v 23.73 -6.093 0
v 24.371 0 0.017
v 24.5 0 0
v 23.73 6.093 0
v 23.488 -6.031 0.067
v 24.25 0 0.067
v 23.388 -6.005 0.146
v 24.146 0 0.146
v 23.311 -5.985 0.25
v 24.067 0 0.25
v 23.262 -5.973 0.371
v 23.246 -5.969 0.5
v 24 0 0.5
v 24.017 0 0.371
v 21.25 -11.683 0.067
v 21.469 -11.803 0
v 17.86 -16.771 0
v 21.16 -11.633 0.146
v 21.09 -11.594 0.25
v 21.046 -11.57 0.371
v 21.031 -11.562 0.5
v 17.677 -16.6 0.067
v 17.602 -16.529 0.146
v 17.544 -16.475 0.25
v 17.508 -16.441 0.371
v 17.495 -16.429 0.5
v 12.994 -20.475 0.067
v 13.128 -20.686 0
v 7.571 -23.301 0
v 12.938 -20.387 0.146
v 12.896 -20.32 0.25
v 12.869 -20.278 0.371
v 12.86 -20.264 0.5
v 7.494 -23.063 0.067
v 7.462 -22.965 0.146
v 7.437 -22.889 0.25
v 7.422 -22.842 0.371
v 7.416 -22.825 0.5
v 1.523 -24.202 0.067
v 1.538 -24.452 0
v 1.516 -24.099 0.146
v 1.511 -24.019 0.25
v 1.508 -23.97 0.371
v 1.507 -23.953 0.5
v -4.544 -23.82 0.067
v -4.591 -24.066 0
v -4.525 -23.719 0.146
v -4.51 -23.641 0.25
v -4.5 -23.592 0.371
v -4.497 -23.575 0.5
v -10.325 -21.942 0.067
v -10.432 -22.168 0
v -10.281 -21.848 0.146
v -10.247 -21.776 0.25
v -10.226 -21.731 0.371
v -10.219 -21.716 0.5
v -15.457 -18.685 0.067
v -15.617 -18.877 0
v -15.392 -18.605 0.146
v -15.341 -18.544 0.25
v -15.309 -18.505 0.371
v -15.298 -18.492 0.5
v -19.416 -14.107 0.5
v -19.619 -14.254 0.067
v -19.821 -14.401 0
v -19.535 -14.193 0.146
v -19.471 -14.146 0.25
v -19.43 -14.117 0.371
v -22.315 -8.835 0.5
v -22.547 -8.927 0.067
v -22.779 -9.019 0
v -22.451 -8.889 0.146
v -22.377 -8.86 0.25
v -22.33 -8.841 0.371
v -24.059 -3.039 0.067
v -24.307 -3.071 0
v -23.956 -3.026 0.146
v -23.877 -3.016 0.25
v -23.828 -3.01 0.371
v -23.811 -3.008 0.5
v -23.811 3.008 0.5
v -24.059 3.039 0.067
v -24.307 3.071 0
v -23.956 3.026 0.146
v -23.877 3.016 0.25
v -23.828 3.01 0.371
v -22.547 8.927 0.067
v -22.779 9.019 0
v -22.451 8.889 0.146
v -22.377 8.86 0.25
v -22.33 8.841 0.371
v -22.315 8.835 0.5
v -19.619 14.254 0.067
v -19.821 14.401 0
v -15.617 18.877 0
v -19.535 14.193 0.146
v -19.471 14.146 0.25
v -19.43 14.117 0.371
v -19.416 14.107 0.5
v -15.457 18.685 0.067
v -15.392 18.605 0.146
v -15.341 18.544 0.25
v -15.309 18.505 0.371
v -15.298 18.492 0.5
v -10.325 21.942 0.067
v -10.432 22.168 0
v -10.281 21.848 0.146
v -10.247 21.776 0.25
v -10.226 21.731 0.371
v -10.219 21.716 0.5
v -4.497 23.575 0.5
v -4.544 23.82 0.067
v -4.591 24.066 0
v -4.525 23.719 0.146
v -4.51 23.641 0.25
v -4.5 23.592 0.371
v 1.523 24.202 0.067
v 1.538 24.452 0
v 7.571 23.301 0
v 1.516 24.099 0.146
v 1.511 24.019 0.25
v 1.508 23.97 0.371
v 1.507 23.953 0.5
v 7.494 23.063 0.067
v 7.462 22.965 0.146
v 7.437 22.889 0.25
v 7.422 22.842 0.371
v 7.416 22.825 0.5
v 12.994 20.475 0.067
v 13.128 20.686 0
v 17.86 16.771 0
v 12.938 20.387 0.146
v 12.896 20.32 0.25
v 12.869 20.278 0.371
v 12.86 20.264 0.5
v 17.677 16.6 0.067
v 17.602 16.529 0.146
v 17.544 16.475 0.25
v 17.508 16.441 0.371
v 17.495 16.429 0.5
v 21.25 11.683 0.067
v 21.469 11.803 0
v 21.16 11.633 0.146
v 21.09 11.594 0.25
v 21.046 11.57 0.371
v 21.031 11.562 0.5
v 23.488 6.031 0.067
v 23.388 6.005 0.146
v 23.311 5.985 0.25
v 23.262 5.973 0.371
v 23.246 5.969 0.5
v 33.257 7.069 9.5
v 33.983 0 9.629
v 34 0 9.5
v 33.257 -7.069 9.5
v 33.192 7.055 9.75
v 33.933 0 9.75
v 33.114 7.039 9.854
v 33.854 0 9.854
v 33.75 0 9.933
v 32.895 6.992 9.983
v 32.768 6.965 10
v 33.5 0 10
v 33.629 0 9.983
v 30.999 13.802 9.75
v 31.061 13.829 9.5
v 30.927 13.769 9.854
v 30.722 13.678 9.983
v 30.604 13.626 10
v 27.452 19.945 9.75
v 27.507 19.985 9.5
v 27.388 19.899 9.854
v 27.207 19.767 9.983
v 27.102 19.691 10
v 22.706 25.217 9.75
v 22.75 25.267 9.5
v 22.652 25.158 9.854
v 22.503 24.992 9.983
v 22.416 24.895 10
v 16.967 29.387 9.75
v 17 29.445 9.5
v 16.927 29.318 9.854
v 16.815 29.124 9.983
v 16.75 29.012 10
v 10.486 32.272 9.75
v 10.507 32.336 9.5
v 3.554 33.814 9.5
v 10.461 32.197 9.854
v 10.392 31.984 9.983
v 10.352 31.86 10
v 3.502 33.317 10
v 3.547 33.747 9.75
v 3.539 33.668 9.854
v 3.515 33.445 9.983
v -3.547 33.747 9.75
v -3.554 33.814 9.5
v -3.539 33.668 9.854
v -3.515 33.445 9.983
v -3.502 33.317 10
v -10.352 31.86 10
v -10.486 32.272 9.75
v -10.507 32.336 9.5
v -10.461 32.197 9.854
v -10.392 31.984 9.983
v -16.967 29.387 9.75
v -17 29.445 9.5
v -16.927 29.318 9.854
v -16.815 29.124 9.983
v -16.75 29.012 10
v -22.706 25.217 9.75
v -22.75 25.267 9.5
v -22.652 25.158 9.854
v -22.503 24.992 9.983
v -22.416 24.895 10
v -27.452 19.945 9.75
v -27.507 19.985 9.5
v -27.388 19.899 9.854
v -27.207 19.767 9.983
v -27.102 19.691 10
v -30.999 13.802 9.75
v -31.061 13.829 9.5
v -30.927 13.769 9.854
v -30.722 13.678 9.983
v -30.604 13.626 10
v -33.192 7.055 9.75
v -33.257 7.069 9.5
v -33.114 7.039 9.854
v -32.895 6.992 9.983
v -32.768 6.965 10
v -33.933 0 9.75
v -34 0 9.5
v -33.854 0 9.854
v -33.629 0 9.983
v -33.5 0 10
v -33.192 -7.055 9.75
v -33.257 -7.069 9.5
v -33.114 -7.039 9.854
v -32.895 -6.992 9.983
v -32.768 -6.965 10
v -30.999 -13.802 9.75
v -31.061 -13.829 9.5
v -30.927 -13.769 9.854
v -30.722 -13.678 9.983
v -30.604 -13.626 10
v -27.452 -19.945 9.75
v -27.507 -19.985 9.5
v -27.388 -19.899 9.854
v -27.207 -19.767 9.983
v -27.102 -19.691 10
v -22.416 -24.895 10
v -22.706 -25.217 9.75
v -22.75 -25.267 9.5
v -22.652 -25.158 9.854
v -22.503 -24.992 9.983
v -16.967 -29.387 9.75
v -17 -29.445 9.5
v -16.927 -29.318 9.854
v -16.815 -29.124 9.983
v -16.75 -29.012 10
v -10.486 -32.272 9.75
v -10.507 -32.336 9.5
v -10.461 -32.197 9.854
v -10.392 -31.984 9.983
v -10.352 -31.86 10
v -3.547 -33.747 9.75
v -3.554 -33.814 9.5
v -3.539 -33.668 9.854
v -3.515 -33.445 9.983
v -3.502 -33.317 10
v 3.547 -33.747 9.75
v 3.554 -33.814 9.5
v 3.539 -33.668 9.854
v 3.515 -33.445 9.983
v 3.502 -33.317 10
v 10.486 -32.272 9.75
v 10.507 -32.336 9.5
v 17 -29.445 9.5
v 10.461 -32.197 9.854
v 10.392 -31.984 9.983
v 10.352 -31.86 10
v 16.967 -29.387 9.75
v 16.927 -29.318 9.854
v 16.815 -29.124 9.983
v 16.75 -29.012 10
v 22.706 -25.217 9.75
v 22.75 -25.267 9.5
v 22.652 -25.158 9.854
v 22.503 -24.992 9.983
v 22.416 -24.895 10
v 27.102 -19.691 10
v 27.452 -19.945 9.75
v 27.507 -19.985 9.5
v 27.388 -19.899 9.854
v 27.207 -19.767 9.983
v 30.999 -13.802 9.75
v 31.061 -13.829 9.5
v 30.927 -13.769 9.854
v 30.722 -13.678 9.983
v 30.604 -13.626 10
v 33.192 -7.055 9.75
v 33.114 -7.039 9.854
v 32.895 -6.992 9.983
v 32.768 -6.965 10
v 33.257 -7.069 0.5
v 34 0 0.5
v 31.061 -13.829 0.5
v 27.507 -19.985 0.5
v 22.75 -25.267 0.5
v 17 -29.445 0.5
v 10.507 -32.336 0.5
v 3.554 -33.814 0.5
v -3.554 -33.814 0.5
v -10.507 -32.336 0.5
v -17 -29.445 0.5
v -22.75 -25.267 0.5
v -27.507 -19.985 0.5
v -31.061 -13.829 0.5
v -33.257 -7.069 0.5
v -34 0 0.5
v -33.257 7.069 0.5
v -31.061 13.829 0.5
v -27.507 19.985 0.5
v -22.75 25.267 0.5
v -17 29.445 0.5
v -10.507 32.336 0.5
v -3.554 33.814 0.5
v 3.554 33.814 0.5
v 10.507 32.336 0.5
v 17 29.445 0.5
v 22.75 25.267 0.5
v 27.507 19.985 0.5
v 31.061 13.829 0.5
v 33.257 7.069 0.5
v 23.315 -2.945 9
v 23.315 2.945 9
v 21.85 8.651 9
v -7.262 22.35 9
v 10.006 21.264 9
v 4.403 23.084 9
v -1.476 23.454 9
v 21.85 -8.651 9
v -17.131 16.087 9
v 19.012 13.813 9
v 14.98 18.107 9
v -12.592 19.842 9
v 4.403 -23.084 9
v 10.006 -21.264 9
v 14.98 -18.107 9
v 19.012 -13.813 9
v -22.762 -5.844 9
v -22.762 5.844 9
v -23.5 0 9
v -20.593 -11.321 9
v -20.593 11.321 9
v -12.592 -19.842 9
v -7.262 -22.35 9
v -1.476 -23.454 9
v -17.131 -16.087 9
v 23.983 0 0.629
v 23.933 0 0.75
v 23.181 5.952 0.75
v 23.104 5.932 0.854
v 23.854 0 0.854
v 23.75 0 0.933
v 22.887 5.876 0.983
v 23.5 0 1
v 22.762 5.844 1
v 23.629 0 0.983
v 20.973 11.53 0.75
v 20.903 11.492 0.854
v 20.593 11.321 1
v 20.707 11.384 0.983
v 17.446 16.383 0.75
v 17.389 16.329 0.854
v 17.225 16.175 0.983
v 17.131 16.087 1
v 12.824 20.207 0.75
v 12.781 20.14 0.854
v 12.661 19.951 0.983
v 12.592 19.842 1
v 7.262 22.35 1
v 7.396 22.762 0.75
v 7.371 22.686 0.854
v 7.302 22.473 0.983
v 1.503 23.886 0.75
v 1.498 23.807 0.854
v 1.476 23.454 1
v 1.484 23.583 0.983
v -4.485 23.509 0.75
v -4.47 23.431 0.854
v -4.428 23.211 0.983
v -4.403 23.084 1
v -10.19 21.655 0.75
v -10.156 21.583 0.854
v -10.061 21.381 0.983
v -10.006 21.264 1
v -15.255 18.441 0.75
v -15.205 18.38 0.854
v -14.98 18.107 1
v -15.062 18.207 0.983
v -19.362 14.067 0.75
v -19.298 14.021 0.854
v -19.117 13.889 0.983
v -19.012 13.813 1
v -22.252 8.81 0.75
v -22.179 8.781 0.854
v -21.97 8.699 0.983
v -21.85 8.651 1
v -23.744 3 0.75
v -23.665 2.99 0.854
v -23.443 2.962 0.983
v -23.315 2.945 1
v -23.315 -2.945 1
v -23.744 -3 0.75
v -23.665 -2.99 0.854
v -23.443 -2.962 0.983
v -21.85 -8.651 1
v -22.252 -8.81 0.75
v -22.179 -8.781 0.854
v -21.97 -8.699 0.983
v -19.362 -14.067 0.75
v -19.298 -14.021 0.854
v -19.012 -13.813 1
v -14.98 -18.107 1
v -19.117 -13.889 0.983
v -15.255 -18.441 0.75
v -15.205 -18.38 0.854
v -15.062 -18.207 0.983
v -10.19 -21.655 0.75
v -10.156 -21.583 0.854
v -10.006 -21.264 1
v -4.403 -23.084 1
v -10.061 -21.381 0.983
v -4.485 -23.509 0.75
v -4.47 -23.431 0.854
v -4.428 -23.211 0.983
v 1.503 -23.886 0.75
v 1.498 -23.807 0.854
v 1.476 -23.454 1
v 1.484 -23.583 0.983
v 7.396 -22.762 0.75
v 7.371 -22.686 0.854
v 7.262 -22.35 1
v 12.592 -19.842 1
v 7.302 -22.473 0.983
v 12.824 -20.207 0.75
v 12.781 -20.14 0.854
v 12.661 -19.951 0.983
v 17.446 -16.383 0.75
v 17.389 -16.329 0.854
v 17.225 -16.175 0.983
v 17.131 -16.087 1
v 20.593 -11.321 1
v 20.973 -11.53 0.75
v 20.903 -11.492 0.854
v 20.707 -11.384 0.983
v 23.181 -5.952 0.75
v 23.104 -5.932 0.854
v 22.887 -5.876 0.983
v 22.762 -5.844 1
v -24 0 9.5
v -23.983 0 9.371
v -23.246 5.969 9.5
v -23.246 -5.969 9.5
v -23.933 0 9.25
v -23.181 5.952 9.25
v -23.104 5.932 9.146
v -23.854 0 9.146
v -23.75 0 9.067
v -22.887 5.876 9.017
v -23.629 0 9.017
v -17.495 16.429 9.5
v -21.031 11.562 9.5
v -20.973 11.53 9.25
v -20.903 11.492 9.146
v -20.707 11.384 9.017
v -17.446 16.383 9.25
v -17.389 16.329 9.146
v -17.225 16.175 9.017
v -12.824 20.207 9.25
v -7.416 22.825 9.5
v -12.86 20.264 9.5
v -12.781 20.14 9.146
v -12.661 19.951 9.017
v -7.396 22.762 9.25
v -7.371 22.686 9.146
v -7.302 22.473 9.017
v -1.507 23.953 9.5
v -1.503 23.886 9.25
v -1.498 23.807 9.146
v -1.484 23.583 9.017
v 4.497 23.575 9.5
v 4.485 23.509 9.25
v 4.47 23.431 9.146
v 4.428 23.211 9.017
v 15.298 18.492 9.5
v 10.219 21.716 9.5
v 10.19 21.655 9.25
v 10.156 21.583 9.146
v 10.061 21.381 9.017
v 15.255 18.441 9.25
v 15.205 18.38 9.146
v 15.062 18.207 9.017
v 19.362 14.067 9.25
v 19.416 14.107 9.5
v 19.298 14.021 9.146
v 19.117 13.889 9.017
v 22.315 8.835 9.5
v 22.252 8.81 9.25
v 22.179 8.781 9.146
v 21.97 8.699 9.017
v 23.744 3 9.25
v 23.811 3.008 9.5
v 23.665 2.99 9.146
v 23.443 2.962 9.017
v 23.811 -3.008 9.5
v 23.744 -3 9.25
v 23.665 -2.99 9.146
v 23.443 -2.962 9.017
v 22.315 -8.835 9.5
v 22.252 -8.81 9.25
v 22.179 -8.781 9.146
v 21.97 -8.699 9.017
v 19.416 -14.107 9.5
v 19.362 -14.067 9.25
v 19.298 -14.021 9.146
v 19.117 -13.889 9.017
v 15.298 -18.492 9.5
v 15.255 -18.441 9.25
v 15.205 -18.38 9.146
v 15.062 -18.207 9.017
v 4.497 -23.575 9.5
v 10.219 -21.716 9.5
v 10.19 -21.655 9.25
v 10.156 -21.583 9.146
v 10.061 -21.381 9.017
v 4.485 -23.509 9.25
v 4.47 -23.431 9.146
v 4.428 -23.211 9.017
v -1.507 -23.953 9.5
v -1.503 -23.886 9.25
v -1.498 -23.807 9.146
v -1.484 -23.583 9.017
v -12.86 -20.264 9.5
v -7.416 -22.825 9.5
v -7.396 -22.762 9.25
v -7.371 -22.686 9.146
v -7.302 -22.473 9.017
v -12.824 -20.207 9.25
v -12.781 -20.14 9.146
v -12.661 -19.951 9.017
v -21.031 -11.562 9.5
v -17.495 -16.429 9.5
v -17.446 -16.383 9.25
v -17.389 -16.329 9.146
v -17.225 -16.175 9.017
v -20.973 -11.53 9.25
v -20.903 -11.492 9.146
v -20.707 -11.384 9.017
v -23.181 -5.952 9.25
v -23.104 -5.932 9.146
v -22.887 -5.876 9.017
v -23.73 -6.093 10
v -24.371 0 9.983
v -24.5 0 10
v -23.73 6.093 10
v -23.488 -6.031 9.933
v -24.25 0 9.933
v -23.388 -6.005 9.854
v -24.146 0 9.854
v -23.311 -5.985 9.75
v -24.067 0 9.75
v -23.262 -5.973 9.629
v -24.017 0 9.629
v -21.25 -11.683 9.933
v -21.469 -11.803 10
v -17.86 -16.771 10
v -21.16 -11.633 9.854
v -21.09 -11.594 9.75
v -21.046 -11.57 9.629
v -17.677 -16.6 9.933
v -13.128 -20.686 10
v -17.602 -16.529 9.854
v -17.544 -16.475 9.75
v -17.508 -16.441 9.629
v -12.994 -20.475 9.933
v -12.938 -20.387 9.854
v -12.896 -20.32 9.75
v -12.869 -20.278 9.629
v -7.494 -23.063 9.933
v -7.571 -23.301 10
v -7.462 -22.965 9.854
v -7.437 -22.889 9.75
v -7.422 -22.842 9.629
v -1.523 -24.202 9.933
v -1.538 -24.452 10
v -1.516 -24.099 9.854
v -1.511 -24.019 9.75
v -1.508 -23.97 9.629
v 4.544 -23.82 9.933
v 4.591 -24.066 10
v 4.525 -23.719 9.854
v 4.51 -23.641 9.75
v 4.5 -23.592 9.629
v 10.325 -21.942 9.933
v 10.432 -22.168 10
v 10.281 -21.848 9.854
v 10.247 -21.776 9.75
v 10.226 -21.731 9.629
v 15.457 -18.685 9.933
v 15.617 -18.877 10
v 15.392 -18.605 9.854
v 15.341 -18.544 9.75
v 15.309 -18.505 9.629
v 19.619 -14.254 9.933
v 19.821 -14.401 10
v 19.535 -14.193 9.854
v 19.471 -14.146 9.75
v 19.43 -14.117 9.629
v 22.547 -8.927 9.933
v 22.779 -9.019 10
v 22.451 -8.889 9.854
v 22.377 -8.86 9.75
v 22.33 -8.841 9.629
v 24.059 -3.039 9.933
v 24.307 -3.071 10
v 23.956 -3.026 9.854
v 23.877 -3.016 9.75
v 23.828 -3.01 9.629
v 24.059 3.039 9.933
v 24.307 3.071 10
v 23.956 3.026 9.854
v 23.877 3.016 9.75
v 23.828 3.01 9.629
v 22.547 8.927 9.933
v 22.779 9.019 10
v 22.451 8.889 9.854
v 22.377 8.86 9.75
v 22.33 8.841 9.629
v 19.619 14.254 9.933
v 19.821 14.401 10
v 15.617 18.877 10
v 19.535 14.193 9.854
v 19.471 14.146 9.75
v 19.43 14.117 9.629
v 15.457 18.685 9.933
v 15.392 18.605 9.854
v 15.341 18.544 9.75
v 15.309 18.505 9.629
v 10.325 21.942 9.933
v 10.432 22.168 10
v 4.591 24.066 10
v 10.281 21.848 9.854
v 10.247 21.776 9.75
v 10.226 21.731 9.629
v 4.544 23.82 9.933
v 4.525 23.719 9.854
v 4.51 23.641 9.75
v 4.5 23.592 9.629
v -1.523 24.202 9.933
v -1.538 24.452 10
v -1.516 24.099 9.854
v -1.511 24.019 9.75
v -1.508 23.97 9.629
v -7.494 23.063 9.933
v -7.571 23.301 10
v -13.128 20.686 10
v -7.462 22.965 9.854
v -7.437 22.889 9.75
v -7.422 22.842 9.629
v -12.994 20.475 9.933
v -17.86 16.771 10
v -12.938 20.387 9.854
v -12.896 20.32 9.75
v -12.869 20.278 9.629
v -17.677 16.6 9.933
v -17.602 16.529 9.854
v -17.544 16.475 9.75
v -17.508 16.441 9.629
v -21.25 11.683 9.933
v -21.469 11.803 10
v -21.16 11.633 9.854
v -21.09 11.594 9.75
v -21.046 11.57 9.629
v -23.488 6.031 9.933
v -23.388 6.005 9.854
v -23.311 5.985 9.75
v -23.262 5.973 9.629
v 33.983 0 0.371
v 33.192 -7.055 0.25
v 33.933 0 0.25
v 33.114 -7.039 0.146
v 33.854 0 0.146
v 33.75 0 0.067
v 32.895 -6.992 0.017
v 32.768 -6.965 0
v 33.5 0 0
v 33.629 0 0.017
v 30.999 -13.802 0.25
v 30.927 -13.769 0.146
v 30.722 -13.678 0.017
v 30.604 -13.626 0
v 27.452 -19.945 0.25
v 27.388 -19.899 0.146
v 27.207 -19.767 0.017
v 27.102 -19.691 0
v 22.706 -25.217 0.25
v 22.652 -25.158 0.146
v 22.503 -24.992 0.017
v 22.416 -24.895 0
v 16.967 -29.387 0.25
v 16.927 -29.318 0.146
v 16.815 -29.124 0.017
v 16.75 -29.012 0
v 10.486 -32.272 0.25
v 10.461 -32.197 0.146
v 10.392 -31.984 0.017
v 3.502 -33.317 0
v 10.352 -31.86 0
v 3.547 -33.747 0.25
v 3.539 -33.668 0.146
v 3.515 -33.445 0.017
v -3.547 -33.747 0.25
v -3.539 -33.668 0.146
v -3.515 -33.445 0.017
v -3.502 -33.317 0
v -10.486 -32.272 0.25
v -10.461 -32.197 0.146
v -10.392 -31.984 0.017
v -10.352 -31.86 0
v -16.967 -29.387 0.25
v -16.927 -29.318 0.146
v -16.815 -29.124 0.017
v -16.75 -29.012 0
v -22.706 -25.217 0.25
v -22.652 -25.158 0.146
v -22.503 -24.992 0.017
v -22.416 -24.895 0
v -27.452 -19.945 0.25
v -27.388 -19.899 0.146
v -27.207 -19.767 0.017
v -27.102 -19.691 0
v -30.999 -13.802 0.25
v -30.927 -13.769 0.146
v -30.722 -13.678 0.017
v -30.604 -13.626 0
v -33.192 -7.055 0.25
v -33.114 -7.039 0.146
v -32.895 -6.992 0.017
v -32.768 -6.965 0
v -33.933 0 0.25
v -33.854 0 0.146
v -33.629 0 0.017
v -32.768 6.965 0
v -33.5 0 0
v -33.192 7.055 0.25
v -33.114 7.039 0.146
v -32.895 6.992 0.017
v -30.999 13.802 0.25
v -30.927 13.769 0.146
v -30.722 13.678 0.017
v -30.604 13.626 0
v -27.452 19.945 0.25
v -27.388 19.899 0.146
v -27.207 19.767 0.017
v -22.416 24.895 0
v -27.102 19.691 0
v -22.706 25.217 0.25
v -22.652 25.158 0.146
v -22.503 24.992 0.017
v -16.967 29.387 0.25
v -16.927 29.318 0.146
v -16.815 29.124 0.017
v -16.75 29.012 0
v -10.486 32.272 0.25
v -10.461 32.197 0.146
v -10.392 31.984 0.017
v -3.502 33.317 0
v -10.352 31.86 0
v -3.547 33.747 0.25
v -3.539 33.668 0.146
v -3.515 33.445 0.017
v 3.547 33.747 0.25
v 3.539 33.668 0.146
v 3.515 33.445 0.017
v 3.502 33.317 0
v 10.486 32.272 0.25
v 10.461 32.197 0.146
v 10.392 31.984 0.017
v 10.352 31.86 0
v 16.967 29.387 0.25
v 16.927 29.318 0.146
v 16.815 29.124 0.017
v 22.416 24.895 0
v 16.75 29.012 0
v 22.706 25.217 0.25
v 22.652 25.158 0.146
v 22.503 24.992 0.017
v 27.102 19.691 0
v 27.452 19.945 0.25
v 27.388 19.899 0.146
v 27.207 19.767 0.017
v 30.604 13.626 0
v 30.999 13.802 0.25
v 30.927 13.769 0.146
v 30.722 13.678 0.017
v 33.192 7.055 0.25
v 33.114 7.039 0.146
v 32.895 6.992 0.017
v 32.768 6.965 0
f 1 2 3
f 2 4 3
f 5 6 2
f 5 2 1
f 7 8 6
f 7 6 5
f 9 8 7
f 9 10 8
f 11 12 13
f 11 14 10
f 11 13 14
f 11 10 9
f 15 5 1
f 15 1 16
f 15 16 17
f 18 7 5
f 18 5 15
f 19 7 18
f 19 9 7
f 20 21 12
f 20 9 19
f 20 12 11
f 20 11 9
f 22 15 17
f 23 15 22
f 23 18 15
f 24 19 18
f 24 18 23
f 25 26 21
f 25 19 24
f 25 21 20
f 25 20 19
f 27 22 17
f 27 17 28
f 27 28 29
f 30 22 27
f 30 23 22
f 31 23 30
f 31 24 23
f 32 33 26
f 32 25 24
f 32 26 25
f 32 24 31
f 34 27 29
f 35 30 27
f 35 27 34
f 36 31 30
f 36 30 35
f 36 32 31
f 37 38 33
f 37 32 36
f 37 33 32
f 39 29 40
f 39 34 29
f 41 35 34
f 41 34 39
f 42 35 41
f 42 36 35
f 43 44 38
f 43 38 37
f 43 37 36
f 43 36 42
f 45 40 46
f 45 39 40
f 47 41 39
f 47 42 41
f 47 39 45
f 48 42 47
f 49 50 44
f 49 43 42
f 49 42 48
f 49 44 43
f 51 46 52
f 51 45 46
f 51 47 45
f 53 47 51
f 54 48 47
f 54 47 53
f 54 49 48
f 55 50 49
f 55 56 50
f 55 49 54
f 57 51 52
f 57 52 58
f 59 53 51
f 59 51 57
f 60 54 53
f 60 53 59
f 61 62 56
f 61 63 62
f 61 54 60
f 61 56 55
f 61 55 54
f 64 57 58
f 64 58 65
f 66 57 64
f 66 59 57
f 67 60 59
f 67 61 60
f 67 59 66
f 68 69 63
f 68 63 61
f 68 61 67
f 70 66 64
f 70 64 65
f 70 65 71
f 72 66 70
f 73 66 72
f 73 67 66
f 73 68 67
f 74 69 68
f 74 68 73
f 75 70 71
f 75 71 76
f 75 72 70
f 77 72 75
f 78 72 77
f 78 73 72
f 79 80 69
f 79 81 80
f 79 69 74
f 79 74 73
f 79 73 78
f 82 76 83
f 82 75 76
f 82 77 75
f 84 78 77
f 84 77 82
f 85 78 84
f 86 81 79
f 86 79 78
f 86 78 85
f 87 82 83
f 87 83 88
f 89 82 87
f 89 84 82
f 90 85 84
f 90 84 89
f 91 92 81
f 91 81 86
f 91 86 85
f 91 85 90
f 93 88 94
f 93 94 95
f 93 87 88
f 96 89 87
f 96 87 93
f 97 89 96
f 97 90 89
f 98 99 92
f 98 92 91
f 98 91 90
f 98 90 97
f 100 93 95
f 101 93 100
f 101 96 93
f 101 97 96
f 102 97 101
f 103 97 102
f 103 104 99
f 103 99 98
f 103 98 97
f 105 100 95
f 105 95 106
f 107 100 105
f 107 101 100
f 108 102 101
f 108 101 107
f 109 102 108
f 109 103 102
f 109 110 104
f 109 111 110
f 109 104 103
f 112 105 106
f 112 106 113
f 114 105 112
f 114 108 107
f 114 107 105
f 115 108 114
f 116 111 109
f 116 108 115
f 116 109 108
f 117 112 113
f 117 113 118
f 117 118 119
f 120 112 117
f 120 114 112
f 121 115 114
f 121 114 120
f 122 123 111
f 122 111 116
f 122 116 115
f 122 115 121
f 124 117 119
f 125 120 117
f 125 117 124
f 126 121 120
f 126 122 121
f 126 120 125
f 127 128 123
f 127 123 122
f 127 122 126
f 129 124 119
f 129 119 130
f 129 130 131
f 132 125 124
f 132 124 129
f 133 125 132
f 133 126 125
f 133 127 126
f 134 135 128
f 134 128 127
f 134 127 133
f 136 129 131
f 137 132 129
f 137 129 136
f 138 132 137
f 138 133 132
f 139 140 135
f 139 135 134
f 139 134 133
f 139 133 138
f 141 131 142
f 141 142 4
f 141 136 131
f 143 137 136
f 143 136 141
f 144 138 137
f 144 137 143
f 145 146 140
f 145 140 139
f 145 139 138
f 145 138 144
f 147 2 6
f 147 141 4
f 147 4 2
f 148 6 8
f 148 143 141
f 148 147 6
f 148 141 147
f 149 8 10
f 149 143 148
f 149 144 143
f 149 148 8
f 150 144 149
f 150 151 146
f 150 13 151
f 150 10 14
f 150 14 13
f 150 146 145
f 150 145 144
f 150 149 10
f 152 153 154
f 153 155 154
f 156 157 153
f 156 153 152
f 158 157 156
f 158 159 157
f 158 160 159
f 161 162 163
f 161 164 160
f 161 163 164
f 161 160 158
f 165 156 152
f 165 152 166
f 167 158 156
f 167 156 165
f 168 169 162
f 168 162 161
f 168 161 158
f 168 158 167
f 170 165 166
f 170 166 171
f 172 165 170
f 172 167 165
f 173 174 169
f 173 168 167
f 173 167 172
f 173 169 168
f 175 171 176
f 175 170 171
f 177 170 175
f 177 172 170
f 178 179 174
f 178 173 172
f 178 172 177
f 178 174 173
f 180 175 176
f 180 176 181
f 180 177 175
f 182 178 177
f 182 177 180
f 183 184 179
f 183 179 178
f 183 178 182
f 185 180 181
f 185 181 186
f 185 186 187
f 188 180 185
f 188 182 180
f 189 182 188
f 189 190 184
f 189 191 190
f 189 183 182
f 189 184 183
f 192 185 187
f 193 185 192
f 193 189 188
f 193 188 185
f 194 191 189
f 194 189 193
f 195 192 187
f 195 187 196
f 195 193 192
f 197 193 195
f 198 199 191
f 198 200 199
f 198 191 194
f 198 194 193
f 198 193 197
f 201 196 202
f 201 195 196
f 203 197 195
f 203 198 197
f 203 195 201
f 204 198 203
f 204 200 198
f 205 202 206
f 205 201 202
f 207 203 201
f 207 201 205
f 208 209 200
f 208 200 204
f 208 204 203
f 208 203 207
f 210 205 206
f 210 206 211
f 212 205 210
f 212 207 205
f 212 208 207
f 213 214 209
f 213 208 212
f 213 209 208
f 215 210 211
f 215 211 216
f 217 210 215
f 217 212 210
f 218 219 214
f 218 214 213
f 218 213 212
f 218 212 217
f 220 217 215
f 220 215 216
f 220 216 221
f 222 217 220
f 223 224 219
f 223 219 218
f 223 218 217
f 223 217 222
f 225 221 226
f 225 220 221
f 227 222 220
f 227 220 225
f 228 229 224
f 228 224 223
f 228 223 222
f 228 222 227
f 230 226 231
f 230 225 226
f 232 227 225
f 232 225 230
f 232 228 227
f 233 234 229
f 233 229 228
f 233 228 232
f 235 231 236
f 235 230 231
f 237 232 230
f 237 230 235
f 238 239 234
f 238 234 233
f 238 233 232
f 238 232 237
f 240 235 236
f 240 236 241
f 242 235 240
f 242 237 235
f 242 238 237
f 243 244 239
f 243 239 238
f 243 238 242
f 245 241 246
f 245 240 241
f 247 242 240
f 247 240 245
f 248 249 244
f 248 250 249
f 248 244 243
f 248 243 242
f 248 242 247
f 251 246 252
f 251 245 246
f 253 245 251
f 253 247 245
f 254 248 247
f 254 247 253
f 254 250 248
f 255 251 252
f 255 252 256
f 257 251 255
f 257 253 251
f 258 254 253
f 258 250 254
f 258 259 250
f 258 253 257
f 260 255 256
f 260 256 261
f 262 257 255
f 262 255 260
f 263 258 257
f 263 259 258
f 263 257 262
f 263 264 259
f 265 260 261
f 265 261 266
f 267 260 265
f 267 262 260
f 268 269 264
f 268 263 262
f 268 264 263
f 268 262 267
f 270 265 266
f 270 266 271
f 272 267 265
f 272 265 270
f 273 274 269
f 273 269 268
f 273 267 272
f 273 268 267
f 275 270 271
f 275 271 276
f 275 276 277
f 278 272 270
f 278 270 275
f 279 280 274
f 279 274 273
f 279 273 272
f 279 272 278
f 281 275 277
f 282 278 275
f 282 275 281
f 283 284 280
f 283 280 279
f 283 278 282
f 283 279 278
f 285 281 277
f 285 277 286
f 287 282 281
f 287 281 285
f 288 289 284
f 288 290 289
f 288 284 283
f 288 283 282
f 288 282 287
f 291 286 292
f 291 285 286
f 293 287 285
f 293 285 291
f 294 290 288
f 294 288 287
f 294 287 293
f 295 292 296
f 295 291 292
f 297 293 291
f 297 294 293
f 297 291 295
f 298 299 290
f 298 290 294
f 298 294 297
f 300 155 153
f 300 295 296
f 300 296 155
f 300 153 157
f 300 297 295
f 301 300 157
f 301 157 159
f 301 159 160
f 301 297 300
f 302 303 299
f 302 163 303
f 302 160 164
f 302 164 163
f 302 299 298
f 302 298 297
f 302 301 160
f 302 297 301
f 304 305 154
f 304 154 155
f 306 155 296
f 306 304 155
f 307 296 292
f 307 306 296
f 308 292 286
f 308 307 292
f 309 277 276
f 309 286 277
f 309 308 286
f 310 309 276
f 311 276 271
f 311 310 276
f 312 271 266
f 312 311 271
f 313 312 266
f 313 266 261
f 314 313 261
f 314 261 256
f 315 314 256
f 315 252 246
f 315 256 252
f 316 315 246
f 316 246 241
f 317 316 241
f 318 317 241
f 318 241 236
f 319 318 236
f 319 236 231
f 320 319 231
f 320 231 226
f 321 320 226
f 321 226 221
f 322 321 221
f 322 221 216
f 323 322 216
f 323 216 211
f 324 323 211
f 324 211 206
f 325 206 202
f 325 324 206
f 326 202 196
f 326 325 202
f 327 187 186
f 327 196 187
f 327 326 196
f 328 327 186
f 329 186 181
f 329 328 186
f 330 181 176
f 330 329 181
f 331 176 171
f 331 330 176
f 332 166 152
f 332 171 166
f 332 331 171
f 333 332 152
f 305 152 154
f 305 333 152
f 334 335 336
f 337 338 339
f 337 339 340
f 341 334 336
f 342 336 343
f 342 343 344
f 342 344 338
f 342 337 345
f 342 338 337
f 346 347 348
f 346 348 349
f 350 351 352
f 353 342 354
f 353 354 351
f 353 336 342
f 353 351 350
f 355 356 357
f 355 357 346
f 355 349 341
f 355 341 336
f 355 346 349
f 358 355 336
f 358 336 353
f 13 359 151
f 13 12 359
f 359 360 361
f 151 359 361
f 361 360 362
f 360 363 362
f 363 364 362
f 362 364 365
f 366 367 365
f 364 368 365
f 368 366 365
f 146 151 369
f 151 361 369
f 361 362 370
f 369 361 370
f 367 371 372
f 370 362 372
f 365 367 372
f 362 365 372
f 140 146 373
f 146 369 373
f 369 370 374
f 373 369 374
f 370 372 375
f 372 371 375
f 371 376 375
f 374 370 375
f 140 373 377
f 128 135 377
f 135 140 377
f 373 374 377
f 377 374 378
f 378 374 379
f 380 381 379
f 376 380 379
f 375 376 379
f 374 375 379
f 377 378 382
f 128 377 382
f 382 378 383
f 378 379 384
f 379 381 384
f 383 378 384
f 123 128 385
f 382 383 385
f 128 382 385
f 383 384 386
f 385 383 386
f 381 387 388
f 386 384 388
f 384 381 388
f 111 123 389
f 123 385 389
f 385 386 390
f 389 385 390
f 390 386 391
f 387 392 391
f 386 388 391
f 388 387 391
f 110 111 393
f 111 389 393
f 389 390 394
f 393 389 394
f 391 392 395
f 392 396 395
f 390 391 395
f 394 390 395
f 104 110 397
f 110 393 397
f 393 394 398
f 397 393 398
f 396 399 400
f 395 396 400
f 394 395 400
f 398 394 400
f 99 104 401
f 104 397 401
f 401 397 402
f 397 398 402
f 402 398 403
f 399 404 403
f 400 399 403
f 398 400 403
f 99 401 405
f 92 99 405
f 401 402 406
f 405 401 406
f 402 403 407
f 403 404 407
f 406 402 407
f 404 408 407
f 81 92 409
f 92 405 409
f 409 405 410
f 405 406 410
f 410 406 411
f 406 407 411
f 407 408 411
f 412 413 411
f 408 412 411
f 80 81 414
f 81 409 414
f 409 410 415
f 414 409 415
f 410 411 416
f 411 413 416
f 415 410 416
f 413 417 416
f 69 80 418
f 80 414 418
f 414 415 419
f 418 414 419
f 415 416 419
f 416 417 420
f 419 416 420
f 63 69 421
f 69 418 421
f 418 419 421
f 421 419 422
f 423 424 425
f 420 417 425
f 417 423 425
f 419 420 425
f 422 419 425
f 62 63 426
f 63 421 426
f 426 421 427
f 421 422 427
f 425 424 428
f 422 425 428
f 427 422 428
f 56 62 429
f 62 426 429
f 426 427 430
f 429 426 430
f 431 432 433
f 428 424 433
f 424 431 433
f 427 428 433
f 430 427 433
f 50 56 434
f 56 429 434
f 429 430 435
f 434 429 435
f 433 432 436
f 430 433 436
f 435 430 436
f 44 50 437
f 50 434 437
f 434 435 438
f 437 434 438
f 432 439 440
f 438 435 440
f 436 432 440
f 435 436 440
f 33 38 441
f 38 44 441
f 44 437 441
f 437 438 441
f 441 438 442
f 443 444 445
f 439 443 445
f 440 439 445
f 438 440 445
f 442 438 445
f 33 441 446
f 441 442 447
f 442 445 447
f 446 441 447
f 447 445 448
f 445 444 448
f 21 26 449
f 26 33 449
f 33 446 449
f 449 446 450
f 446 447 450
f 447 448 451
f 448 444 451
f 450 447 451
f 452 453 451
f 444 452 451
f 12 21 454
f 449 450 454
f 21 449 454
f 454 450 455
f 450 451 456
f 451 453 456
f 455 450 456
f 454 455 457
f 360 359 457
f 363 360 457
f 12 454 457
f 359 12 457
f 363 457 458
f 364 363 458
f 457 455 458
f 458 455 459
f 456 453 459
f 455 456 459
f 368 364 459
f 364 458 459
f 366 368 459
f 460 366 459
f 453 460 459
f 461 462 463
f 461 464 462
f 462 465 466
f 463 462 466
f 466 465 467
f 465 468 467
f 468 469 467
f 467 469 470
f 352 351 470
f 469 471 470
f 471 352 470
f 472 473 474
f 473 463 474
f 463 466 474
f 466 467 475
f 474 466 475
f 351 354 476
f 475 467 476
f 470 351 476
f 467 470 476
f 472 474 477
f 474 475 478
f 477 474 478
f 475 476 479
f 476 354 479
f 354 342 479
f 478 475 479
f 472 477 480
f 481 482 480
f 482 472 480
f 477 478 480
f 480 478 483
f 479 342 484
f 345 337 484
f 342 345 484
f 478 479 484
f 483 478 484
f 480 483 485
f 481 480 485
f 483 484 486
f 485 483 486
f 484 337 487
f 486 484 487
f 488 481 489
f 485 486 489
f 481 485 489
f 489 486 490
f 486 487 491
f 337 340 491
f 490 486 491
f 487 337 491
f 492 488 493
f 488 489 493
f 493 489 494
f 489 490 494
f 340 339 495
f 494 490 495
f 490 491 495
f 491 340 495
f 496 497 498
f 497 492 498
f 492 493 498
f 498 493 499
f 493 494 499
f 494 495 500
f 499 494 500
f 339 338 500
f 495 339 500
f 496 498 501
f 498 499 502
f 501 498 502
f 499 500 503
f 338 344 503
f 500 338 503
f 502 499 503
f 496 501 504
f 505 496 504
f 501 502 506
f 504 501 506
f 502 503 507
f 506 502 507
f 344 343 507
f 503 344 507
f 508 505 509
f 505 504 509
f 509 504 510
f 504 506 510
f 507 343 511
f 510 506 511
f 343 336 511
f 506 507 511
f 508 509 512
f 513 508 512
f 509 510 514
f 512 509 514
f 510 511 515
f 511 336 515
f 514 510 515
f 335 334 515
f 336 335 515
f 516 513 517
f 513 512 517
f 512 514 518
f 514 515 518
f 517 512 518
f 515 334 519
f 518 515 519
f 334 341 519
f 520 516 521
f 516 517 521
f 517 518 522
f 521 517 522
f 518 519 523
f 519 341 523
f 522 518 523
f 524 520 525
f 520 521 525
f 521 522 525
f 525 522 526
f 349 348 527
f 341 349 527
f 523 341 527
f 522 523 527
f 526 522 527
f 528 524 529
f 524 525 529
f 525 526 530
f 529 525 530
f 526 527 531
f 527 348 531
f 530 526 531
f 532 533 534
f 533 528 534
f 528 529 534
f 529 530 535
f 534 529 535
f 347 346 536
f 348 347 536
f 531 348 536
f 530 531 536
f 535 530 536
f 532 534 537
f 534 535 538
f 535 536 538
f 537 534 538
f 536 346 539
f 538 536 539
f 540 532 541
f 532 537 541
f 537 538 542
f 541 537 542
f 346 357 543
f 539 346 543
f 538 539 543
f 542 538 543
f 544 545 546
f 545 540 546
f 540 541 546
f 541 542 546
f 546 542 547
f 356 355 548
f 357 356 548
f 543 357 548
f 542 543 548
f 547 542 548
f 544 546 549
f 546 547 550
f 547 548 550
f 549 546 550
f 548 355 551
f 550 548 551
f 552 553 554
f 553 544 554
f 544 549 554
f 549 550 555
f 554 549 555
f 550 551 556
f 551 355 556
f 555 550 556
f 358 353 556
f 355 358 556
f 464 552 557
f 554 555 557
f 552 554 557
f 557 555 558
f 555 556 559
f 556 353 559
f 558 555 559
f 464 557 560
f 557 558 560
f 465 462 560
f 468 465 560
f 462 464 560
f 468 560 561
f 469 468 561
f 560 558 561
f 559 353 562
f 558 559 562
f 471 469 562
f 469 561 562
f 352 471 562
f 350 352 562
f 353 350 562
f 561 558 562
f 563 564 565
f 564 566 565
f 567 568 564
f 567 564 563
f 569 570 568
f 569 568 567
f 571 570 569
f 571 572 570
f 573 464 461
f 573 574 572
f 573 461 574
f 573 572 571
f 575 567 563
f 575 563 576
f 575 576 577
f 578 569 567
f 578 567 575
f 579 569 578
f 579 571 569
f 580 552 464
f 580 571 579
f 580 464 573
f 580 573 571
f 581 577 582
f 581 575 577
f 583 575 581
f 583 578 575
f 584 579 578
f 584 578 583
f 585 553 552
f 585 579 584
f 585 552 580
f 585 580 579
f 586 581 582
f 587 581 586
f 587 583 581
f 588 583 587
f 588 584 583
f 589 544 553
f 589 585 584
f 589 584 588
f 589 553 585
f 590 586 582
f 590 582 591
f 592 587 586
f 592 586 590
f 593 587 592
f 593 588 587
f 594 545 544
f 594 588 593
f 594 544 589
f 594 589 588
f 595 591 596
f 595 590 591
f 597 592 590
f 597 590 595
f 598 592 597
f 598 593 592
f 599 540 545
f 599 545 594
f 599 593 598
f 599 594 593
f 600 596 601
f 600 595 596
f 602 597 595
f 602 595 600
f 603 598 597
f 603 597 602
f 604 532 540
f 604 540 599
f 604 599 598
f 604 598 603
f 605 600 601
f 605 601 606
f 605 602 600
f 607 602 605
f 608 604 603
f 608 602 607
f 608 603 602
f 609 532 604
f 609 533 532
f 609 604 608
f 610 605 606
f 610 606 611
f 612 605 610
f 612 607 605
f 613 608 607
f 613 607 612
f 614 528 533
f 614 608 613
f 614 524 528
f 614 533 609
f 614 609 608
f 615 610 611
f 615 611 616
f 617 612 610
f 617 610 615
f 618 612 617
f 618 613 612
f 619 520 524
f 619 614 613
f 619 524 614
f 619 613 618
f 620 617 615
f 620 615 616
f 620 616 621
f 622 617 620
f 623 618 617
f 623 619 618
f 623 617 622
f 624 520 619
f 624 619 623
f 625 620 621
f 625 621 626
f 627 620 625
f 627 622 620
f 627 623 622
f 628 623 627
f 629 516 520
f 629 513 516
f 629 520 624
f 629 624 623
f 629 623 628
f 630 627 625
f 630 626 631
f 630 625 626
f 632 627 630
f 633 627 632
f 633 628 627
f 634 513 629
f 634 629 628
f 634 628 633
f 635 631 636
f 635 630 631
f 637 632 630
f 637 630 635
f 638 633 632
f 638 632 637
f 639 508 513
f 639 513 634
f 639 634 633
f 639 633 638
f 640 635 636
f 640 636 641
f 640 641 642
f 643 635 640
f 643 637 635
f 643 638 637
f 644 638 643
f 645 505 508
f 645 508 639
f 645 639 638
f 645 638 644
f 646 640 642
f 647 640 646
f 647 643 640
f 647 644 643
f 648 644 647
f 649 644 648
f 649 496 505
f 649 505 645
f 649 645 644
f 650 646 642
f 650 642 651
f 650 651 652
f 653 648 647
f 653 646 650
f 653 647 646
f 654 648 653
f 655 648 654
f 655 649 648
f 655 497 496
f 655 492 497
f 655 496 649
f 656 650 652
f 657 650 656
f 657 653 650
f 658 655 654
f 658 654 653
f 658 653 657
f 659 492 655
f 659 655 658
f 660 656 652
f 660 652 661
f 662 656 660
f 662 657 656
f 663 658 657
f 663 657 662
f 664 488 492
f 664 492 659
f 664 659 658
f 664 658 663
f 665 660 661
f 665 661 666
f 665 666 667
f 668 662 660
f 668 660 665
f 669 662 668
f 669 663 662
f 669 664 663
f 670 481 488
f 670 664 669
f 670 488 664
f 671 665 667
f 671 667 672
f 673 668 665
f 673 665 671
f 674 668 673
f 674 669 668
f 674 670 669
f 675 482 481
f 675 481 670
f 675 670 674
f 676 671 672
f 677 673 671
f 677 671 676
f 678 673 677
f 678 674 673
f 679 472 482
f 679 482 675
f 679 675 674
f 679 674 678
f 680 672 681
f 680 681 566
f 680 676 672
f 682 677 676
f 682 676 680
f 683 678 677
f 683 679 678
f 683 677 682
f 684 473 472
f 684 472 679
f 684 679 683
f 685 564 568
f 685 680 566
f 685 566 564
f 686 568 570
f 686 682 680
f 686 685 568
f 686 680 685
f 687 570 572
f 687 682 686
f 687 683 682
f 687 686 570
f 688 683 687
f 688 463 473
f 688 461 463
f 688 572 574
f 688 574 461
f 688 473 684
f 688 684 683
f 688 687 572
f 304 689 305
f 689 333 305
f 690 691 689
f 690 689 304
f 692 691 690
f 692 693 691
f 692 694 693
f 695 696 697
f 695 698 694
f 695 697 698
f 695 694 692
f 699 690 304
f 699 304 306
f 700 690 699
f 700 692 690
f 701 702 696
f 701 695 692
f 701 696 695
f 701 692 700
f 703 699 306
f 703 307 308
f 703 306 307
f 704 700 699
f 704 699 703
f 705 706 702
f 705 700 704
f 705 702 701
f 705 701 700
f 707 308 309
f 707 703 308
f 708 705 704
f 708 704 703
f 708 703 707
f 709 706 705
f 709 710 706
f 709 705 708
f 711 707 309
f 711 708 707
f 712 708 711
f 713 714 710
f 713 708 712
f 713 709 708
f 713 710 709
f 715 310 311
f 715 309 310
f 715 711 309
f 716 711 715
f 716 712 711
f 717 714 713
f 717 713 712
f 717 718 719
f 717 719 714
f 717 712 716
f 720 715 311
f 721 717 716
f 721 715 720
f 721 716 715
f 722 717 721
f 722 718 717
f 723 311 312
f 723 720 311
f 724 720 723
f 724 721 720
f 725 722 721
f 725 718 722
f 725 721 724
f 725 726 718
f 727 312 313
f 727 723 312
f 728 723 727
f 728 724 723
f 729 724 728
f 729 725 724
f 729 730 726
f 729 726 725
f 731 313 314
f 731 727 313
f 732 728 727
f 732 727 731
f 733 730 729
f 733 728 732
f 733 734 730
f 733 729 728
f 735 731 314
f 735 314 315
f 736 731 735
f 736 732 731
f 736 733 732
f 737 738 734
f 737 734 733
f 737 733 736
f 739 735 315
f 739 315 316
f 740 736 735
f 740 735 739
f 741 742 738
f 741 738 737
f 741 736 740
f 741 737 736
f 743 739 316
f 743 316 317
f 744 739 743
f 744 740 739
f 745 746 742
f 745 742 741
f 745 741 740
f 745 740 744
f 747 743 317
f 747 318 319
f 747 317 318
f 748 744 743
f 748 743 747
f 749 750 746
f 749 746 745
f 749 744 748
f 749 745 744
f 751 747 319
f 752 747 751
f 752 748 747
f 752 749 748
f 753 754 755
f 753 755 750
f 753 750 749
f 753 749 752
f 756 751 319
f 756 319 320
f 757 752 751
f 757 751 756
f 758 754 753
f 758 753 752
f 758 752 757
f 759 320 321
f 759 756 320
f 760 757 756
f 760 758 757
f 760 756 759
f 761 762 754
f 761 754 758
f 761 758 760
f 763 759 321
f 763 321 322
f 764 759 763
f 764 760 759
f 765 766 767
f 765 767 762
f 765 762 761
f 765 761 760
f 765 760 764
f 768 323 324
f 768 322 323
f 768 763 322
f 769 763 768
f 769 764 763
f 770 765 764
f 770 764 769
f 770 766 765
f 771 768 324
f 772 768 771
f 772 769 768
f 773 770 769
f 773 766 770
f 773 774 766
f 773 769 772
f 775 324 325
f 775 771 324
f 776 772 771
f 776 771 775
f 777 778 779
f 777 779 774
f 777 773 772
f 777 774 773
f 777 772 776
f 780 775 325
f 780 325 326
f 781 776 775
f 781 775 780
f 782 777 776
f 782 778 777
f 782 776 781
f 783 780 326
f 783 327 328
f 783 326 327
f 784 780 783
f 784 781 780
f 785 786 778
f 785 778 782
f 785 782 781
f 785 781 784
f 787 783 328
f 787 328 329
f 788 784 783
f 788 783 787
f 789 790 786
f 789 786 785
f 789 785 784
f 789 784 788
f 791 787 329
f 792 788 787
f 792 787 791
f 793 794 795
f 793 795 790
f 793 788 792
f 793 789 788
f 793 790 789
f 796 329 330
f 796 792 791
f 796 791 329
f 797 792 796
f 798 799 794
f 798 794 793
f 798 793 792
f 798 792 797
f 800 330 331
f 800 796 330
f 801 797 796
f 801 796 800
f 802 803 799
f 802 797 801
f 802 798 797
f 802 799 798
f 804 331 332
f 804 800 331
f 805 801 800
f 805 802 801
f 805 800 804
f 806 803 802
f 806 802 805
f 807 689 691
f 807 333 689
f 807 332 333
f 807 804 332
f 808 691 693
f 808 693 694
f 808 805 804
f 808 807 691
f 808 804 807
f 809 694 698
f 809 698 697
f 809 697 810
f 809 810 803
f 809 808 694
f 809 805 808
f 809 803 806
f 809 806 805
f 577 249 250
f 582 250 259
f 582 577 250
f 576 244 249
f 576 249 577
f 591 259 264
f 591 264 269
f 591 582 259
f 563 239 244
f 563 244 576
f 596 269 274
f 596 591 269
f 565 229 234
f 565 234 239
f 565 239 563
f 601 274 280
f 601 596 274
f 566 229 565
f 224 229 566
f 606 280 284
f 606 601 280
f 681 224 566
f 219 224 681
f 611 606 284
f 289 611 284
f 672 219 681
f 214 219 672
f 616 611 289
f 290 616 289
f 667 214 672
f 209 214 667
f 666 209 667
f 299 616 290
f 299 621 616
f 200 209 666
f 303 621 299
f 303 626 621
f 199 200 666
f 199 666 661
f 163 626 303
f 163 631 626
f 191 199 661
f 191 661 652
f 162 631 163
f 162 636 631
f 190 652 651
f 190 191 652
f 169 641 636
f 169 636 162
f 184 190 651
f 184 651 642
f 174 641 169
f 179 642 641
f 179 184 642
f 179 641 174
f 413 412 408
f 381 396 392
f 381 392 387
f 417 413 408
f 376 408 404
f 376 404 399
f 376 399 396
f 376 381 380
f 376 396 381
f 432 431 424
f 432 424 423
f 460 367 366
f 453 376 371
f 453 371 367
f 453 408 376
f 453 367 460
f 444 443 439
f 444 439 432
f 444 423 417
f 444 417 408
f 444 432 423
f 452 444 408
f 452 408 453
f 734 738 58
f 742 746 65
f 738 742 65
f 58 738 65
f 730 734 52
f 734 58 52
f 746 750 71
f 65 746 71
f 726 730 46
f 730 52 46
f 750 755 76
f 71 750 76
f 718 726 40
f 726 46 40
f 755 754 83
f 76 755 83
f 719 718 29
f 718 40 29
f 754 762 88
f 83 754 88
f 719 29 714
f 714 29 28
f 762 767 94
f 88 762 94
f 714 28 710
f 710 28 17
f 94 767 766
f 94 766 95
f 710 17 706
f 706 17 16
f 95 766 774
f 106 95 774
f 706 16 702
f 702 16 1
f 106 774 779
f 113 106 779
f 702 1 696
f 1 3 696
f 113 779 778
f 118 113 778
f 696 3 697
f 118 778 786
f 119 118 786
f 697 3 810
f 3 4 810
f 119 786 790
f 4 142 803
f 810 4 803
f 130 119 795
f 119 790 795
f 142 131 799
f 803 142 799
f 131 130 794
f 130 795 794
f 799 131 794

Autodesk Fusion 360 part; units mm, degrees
sketch "Skizze1" plane through (0, 0, 0) normal (0, 0, 1) x (1, 0, 0)
  circle A0 centre (0, 0) radius 34
  dimension "d1" = 68
extrude "Extrusion1" add sketch "Skizze1" along normal blind 10
sketch "Skizze2" plane through (0, 0, 10) normal (0, 0, 1) x (-1, 0, 0)
  circle A0 centre (0, 0) radius 34
  circle A1 centre (0, 0) radius 24
  dimension "d4" = 48
extrude "Extrusion2" cut sketch "Skizze2" against normal blind 1 contours A1
sketch "Skizze3" plane through (0, 0, 0) normal (0, 0, -1) x (1, 0, 0)
  circle A0 centre (0, 0) radius 34
  circle A1 centre (0, 0) radius 24
  dimension "d7" = 48
extrude "Extrusion3" cut sketch "Skizze3" against normal blind 1 contours A1
fillet "Abrundung1" radius 0.5 6 edges at (22.3759, -8.6788, 9) (-31.6991, -12.2949, 10) (-31.6991, -12.2949, 0) (-22.3759, -8.6788, 0) (-22.3759, -8.6788, 1) (22.3759, -8.6788, 10)
